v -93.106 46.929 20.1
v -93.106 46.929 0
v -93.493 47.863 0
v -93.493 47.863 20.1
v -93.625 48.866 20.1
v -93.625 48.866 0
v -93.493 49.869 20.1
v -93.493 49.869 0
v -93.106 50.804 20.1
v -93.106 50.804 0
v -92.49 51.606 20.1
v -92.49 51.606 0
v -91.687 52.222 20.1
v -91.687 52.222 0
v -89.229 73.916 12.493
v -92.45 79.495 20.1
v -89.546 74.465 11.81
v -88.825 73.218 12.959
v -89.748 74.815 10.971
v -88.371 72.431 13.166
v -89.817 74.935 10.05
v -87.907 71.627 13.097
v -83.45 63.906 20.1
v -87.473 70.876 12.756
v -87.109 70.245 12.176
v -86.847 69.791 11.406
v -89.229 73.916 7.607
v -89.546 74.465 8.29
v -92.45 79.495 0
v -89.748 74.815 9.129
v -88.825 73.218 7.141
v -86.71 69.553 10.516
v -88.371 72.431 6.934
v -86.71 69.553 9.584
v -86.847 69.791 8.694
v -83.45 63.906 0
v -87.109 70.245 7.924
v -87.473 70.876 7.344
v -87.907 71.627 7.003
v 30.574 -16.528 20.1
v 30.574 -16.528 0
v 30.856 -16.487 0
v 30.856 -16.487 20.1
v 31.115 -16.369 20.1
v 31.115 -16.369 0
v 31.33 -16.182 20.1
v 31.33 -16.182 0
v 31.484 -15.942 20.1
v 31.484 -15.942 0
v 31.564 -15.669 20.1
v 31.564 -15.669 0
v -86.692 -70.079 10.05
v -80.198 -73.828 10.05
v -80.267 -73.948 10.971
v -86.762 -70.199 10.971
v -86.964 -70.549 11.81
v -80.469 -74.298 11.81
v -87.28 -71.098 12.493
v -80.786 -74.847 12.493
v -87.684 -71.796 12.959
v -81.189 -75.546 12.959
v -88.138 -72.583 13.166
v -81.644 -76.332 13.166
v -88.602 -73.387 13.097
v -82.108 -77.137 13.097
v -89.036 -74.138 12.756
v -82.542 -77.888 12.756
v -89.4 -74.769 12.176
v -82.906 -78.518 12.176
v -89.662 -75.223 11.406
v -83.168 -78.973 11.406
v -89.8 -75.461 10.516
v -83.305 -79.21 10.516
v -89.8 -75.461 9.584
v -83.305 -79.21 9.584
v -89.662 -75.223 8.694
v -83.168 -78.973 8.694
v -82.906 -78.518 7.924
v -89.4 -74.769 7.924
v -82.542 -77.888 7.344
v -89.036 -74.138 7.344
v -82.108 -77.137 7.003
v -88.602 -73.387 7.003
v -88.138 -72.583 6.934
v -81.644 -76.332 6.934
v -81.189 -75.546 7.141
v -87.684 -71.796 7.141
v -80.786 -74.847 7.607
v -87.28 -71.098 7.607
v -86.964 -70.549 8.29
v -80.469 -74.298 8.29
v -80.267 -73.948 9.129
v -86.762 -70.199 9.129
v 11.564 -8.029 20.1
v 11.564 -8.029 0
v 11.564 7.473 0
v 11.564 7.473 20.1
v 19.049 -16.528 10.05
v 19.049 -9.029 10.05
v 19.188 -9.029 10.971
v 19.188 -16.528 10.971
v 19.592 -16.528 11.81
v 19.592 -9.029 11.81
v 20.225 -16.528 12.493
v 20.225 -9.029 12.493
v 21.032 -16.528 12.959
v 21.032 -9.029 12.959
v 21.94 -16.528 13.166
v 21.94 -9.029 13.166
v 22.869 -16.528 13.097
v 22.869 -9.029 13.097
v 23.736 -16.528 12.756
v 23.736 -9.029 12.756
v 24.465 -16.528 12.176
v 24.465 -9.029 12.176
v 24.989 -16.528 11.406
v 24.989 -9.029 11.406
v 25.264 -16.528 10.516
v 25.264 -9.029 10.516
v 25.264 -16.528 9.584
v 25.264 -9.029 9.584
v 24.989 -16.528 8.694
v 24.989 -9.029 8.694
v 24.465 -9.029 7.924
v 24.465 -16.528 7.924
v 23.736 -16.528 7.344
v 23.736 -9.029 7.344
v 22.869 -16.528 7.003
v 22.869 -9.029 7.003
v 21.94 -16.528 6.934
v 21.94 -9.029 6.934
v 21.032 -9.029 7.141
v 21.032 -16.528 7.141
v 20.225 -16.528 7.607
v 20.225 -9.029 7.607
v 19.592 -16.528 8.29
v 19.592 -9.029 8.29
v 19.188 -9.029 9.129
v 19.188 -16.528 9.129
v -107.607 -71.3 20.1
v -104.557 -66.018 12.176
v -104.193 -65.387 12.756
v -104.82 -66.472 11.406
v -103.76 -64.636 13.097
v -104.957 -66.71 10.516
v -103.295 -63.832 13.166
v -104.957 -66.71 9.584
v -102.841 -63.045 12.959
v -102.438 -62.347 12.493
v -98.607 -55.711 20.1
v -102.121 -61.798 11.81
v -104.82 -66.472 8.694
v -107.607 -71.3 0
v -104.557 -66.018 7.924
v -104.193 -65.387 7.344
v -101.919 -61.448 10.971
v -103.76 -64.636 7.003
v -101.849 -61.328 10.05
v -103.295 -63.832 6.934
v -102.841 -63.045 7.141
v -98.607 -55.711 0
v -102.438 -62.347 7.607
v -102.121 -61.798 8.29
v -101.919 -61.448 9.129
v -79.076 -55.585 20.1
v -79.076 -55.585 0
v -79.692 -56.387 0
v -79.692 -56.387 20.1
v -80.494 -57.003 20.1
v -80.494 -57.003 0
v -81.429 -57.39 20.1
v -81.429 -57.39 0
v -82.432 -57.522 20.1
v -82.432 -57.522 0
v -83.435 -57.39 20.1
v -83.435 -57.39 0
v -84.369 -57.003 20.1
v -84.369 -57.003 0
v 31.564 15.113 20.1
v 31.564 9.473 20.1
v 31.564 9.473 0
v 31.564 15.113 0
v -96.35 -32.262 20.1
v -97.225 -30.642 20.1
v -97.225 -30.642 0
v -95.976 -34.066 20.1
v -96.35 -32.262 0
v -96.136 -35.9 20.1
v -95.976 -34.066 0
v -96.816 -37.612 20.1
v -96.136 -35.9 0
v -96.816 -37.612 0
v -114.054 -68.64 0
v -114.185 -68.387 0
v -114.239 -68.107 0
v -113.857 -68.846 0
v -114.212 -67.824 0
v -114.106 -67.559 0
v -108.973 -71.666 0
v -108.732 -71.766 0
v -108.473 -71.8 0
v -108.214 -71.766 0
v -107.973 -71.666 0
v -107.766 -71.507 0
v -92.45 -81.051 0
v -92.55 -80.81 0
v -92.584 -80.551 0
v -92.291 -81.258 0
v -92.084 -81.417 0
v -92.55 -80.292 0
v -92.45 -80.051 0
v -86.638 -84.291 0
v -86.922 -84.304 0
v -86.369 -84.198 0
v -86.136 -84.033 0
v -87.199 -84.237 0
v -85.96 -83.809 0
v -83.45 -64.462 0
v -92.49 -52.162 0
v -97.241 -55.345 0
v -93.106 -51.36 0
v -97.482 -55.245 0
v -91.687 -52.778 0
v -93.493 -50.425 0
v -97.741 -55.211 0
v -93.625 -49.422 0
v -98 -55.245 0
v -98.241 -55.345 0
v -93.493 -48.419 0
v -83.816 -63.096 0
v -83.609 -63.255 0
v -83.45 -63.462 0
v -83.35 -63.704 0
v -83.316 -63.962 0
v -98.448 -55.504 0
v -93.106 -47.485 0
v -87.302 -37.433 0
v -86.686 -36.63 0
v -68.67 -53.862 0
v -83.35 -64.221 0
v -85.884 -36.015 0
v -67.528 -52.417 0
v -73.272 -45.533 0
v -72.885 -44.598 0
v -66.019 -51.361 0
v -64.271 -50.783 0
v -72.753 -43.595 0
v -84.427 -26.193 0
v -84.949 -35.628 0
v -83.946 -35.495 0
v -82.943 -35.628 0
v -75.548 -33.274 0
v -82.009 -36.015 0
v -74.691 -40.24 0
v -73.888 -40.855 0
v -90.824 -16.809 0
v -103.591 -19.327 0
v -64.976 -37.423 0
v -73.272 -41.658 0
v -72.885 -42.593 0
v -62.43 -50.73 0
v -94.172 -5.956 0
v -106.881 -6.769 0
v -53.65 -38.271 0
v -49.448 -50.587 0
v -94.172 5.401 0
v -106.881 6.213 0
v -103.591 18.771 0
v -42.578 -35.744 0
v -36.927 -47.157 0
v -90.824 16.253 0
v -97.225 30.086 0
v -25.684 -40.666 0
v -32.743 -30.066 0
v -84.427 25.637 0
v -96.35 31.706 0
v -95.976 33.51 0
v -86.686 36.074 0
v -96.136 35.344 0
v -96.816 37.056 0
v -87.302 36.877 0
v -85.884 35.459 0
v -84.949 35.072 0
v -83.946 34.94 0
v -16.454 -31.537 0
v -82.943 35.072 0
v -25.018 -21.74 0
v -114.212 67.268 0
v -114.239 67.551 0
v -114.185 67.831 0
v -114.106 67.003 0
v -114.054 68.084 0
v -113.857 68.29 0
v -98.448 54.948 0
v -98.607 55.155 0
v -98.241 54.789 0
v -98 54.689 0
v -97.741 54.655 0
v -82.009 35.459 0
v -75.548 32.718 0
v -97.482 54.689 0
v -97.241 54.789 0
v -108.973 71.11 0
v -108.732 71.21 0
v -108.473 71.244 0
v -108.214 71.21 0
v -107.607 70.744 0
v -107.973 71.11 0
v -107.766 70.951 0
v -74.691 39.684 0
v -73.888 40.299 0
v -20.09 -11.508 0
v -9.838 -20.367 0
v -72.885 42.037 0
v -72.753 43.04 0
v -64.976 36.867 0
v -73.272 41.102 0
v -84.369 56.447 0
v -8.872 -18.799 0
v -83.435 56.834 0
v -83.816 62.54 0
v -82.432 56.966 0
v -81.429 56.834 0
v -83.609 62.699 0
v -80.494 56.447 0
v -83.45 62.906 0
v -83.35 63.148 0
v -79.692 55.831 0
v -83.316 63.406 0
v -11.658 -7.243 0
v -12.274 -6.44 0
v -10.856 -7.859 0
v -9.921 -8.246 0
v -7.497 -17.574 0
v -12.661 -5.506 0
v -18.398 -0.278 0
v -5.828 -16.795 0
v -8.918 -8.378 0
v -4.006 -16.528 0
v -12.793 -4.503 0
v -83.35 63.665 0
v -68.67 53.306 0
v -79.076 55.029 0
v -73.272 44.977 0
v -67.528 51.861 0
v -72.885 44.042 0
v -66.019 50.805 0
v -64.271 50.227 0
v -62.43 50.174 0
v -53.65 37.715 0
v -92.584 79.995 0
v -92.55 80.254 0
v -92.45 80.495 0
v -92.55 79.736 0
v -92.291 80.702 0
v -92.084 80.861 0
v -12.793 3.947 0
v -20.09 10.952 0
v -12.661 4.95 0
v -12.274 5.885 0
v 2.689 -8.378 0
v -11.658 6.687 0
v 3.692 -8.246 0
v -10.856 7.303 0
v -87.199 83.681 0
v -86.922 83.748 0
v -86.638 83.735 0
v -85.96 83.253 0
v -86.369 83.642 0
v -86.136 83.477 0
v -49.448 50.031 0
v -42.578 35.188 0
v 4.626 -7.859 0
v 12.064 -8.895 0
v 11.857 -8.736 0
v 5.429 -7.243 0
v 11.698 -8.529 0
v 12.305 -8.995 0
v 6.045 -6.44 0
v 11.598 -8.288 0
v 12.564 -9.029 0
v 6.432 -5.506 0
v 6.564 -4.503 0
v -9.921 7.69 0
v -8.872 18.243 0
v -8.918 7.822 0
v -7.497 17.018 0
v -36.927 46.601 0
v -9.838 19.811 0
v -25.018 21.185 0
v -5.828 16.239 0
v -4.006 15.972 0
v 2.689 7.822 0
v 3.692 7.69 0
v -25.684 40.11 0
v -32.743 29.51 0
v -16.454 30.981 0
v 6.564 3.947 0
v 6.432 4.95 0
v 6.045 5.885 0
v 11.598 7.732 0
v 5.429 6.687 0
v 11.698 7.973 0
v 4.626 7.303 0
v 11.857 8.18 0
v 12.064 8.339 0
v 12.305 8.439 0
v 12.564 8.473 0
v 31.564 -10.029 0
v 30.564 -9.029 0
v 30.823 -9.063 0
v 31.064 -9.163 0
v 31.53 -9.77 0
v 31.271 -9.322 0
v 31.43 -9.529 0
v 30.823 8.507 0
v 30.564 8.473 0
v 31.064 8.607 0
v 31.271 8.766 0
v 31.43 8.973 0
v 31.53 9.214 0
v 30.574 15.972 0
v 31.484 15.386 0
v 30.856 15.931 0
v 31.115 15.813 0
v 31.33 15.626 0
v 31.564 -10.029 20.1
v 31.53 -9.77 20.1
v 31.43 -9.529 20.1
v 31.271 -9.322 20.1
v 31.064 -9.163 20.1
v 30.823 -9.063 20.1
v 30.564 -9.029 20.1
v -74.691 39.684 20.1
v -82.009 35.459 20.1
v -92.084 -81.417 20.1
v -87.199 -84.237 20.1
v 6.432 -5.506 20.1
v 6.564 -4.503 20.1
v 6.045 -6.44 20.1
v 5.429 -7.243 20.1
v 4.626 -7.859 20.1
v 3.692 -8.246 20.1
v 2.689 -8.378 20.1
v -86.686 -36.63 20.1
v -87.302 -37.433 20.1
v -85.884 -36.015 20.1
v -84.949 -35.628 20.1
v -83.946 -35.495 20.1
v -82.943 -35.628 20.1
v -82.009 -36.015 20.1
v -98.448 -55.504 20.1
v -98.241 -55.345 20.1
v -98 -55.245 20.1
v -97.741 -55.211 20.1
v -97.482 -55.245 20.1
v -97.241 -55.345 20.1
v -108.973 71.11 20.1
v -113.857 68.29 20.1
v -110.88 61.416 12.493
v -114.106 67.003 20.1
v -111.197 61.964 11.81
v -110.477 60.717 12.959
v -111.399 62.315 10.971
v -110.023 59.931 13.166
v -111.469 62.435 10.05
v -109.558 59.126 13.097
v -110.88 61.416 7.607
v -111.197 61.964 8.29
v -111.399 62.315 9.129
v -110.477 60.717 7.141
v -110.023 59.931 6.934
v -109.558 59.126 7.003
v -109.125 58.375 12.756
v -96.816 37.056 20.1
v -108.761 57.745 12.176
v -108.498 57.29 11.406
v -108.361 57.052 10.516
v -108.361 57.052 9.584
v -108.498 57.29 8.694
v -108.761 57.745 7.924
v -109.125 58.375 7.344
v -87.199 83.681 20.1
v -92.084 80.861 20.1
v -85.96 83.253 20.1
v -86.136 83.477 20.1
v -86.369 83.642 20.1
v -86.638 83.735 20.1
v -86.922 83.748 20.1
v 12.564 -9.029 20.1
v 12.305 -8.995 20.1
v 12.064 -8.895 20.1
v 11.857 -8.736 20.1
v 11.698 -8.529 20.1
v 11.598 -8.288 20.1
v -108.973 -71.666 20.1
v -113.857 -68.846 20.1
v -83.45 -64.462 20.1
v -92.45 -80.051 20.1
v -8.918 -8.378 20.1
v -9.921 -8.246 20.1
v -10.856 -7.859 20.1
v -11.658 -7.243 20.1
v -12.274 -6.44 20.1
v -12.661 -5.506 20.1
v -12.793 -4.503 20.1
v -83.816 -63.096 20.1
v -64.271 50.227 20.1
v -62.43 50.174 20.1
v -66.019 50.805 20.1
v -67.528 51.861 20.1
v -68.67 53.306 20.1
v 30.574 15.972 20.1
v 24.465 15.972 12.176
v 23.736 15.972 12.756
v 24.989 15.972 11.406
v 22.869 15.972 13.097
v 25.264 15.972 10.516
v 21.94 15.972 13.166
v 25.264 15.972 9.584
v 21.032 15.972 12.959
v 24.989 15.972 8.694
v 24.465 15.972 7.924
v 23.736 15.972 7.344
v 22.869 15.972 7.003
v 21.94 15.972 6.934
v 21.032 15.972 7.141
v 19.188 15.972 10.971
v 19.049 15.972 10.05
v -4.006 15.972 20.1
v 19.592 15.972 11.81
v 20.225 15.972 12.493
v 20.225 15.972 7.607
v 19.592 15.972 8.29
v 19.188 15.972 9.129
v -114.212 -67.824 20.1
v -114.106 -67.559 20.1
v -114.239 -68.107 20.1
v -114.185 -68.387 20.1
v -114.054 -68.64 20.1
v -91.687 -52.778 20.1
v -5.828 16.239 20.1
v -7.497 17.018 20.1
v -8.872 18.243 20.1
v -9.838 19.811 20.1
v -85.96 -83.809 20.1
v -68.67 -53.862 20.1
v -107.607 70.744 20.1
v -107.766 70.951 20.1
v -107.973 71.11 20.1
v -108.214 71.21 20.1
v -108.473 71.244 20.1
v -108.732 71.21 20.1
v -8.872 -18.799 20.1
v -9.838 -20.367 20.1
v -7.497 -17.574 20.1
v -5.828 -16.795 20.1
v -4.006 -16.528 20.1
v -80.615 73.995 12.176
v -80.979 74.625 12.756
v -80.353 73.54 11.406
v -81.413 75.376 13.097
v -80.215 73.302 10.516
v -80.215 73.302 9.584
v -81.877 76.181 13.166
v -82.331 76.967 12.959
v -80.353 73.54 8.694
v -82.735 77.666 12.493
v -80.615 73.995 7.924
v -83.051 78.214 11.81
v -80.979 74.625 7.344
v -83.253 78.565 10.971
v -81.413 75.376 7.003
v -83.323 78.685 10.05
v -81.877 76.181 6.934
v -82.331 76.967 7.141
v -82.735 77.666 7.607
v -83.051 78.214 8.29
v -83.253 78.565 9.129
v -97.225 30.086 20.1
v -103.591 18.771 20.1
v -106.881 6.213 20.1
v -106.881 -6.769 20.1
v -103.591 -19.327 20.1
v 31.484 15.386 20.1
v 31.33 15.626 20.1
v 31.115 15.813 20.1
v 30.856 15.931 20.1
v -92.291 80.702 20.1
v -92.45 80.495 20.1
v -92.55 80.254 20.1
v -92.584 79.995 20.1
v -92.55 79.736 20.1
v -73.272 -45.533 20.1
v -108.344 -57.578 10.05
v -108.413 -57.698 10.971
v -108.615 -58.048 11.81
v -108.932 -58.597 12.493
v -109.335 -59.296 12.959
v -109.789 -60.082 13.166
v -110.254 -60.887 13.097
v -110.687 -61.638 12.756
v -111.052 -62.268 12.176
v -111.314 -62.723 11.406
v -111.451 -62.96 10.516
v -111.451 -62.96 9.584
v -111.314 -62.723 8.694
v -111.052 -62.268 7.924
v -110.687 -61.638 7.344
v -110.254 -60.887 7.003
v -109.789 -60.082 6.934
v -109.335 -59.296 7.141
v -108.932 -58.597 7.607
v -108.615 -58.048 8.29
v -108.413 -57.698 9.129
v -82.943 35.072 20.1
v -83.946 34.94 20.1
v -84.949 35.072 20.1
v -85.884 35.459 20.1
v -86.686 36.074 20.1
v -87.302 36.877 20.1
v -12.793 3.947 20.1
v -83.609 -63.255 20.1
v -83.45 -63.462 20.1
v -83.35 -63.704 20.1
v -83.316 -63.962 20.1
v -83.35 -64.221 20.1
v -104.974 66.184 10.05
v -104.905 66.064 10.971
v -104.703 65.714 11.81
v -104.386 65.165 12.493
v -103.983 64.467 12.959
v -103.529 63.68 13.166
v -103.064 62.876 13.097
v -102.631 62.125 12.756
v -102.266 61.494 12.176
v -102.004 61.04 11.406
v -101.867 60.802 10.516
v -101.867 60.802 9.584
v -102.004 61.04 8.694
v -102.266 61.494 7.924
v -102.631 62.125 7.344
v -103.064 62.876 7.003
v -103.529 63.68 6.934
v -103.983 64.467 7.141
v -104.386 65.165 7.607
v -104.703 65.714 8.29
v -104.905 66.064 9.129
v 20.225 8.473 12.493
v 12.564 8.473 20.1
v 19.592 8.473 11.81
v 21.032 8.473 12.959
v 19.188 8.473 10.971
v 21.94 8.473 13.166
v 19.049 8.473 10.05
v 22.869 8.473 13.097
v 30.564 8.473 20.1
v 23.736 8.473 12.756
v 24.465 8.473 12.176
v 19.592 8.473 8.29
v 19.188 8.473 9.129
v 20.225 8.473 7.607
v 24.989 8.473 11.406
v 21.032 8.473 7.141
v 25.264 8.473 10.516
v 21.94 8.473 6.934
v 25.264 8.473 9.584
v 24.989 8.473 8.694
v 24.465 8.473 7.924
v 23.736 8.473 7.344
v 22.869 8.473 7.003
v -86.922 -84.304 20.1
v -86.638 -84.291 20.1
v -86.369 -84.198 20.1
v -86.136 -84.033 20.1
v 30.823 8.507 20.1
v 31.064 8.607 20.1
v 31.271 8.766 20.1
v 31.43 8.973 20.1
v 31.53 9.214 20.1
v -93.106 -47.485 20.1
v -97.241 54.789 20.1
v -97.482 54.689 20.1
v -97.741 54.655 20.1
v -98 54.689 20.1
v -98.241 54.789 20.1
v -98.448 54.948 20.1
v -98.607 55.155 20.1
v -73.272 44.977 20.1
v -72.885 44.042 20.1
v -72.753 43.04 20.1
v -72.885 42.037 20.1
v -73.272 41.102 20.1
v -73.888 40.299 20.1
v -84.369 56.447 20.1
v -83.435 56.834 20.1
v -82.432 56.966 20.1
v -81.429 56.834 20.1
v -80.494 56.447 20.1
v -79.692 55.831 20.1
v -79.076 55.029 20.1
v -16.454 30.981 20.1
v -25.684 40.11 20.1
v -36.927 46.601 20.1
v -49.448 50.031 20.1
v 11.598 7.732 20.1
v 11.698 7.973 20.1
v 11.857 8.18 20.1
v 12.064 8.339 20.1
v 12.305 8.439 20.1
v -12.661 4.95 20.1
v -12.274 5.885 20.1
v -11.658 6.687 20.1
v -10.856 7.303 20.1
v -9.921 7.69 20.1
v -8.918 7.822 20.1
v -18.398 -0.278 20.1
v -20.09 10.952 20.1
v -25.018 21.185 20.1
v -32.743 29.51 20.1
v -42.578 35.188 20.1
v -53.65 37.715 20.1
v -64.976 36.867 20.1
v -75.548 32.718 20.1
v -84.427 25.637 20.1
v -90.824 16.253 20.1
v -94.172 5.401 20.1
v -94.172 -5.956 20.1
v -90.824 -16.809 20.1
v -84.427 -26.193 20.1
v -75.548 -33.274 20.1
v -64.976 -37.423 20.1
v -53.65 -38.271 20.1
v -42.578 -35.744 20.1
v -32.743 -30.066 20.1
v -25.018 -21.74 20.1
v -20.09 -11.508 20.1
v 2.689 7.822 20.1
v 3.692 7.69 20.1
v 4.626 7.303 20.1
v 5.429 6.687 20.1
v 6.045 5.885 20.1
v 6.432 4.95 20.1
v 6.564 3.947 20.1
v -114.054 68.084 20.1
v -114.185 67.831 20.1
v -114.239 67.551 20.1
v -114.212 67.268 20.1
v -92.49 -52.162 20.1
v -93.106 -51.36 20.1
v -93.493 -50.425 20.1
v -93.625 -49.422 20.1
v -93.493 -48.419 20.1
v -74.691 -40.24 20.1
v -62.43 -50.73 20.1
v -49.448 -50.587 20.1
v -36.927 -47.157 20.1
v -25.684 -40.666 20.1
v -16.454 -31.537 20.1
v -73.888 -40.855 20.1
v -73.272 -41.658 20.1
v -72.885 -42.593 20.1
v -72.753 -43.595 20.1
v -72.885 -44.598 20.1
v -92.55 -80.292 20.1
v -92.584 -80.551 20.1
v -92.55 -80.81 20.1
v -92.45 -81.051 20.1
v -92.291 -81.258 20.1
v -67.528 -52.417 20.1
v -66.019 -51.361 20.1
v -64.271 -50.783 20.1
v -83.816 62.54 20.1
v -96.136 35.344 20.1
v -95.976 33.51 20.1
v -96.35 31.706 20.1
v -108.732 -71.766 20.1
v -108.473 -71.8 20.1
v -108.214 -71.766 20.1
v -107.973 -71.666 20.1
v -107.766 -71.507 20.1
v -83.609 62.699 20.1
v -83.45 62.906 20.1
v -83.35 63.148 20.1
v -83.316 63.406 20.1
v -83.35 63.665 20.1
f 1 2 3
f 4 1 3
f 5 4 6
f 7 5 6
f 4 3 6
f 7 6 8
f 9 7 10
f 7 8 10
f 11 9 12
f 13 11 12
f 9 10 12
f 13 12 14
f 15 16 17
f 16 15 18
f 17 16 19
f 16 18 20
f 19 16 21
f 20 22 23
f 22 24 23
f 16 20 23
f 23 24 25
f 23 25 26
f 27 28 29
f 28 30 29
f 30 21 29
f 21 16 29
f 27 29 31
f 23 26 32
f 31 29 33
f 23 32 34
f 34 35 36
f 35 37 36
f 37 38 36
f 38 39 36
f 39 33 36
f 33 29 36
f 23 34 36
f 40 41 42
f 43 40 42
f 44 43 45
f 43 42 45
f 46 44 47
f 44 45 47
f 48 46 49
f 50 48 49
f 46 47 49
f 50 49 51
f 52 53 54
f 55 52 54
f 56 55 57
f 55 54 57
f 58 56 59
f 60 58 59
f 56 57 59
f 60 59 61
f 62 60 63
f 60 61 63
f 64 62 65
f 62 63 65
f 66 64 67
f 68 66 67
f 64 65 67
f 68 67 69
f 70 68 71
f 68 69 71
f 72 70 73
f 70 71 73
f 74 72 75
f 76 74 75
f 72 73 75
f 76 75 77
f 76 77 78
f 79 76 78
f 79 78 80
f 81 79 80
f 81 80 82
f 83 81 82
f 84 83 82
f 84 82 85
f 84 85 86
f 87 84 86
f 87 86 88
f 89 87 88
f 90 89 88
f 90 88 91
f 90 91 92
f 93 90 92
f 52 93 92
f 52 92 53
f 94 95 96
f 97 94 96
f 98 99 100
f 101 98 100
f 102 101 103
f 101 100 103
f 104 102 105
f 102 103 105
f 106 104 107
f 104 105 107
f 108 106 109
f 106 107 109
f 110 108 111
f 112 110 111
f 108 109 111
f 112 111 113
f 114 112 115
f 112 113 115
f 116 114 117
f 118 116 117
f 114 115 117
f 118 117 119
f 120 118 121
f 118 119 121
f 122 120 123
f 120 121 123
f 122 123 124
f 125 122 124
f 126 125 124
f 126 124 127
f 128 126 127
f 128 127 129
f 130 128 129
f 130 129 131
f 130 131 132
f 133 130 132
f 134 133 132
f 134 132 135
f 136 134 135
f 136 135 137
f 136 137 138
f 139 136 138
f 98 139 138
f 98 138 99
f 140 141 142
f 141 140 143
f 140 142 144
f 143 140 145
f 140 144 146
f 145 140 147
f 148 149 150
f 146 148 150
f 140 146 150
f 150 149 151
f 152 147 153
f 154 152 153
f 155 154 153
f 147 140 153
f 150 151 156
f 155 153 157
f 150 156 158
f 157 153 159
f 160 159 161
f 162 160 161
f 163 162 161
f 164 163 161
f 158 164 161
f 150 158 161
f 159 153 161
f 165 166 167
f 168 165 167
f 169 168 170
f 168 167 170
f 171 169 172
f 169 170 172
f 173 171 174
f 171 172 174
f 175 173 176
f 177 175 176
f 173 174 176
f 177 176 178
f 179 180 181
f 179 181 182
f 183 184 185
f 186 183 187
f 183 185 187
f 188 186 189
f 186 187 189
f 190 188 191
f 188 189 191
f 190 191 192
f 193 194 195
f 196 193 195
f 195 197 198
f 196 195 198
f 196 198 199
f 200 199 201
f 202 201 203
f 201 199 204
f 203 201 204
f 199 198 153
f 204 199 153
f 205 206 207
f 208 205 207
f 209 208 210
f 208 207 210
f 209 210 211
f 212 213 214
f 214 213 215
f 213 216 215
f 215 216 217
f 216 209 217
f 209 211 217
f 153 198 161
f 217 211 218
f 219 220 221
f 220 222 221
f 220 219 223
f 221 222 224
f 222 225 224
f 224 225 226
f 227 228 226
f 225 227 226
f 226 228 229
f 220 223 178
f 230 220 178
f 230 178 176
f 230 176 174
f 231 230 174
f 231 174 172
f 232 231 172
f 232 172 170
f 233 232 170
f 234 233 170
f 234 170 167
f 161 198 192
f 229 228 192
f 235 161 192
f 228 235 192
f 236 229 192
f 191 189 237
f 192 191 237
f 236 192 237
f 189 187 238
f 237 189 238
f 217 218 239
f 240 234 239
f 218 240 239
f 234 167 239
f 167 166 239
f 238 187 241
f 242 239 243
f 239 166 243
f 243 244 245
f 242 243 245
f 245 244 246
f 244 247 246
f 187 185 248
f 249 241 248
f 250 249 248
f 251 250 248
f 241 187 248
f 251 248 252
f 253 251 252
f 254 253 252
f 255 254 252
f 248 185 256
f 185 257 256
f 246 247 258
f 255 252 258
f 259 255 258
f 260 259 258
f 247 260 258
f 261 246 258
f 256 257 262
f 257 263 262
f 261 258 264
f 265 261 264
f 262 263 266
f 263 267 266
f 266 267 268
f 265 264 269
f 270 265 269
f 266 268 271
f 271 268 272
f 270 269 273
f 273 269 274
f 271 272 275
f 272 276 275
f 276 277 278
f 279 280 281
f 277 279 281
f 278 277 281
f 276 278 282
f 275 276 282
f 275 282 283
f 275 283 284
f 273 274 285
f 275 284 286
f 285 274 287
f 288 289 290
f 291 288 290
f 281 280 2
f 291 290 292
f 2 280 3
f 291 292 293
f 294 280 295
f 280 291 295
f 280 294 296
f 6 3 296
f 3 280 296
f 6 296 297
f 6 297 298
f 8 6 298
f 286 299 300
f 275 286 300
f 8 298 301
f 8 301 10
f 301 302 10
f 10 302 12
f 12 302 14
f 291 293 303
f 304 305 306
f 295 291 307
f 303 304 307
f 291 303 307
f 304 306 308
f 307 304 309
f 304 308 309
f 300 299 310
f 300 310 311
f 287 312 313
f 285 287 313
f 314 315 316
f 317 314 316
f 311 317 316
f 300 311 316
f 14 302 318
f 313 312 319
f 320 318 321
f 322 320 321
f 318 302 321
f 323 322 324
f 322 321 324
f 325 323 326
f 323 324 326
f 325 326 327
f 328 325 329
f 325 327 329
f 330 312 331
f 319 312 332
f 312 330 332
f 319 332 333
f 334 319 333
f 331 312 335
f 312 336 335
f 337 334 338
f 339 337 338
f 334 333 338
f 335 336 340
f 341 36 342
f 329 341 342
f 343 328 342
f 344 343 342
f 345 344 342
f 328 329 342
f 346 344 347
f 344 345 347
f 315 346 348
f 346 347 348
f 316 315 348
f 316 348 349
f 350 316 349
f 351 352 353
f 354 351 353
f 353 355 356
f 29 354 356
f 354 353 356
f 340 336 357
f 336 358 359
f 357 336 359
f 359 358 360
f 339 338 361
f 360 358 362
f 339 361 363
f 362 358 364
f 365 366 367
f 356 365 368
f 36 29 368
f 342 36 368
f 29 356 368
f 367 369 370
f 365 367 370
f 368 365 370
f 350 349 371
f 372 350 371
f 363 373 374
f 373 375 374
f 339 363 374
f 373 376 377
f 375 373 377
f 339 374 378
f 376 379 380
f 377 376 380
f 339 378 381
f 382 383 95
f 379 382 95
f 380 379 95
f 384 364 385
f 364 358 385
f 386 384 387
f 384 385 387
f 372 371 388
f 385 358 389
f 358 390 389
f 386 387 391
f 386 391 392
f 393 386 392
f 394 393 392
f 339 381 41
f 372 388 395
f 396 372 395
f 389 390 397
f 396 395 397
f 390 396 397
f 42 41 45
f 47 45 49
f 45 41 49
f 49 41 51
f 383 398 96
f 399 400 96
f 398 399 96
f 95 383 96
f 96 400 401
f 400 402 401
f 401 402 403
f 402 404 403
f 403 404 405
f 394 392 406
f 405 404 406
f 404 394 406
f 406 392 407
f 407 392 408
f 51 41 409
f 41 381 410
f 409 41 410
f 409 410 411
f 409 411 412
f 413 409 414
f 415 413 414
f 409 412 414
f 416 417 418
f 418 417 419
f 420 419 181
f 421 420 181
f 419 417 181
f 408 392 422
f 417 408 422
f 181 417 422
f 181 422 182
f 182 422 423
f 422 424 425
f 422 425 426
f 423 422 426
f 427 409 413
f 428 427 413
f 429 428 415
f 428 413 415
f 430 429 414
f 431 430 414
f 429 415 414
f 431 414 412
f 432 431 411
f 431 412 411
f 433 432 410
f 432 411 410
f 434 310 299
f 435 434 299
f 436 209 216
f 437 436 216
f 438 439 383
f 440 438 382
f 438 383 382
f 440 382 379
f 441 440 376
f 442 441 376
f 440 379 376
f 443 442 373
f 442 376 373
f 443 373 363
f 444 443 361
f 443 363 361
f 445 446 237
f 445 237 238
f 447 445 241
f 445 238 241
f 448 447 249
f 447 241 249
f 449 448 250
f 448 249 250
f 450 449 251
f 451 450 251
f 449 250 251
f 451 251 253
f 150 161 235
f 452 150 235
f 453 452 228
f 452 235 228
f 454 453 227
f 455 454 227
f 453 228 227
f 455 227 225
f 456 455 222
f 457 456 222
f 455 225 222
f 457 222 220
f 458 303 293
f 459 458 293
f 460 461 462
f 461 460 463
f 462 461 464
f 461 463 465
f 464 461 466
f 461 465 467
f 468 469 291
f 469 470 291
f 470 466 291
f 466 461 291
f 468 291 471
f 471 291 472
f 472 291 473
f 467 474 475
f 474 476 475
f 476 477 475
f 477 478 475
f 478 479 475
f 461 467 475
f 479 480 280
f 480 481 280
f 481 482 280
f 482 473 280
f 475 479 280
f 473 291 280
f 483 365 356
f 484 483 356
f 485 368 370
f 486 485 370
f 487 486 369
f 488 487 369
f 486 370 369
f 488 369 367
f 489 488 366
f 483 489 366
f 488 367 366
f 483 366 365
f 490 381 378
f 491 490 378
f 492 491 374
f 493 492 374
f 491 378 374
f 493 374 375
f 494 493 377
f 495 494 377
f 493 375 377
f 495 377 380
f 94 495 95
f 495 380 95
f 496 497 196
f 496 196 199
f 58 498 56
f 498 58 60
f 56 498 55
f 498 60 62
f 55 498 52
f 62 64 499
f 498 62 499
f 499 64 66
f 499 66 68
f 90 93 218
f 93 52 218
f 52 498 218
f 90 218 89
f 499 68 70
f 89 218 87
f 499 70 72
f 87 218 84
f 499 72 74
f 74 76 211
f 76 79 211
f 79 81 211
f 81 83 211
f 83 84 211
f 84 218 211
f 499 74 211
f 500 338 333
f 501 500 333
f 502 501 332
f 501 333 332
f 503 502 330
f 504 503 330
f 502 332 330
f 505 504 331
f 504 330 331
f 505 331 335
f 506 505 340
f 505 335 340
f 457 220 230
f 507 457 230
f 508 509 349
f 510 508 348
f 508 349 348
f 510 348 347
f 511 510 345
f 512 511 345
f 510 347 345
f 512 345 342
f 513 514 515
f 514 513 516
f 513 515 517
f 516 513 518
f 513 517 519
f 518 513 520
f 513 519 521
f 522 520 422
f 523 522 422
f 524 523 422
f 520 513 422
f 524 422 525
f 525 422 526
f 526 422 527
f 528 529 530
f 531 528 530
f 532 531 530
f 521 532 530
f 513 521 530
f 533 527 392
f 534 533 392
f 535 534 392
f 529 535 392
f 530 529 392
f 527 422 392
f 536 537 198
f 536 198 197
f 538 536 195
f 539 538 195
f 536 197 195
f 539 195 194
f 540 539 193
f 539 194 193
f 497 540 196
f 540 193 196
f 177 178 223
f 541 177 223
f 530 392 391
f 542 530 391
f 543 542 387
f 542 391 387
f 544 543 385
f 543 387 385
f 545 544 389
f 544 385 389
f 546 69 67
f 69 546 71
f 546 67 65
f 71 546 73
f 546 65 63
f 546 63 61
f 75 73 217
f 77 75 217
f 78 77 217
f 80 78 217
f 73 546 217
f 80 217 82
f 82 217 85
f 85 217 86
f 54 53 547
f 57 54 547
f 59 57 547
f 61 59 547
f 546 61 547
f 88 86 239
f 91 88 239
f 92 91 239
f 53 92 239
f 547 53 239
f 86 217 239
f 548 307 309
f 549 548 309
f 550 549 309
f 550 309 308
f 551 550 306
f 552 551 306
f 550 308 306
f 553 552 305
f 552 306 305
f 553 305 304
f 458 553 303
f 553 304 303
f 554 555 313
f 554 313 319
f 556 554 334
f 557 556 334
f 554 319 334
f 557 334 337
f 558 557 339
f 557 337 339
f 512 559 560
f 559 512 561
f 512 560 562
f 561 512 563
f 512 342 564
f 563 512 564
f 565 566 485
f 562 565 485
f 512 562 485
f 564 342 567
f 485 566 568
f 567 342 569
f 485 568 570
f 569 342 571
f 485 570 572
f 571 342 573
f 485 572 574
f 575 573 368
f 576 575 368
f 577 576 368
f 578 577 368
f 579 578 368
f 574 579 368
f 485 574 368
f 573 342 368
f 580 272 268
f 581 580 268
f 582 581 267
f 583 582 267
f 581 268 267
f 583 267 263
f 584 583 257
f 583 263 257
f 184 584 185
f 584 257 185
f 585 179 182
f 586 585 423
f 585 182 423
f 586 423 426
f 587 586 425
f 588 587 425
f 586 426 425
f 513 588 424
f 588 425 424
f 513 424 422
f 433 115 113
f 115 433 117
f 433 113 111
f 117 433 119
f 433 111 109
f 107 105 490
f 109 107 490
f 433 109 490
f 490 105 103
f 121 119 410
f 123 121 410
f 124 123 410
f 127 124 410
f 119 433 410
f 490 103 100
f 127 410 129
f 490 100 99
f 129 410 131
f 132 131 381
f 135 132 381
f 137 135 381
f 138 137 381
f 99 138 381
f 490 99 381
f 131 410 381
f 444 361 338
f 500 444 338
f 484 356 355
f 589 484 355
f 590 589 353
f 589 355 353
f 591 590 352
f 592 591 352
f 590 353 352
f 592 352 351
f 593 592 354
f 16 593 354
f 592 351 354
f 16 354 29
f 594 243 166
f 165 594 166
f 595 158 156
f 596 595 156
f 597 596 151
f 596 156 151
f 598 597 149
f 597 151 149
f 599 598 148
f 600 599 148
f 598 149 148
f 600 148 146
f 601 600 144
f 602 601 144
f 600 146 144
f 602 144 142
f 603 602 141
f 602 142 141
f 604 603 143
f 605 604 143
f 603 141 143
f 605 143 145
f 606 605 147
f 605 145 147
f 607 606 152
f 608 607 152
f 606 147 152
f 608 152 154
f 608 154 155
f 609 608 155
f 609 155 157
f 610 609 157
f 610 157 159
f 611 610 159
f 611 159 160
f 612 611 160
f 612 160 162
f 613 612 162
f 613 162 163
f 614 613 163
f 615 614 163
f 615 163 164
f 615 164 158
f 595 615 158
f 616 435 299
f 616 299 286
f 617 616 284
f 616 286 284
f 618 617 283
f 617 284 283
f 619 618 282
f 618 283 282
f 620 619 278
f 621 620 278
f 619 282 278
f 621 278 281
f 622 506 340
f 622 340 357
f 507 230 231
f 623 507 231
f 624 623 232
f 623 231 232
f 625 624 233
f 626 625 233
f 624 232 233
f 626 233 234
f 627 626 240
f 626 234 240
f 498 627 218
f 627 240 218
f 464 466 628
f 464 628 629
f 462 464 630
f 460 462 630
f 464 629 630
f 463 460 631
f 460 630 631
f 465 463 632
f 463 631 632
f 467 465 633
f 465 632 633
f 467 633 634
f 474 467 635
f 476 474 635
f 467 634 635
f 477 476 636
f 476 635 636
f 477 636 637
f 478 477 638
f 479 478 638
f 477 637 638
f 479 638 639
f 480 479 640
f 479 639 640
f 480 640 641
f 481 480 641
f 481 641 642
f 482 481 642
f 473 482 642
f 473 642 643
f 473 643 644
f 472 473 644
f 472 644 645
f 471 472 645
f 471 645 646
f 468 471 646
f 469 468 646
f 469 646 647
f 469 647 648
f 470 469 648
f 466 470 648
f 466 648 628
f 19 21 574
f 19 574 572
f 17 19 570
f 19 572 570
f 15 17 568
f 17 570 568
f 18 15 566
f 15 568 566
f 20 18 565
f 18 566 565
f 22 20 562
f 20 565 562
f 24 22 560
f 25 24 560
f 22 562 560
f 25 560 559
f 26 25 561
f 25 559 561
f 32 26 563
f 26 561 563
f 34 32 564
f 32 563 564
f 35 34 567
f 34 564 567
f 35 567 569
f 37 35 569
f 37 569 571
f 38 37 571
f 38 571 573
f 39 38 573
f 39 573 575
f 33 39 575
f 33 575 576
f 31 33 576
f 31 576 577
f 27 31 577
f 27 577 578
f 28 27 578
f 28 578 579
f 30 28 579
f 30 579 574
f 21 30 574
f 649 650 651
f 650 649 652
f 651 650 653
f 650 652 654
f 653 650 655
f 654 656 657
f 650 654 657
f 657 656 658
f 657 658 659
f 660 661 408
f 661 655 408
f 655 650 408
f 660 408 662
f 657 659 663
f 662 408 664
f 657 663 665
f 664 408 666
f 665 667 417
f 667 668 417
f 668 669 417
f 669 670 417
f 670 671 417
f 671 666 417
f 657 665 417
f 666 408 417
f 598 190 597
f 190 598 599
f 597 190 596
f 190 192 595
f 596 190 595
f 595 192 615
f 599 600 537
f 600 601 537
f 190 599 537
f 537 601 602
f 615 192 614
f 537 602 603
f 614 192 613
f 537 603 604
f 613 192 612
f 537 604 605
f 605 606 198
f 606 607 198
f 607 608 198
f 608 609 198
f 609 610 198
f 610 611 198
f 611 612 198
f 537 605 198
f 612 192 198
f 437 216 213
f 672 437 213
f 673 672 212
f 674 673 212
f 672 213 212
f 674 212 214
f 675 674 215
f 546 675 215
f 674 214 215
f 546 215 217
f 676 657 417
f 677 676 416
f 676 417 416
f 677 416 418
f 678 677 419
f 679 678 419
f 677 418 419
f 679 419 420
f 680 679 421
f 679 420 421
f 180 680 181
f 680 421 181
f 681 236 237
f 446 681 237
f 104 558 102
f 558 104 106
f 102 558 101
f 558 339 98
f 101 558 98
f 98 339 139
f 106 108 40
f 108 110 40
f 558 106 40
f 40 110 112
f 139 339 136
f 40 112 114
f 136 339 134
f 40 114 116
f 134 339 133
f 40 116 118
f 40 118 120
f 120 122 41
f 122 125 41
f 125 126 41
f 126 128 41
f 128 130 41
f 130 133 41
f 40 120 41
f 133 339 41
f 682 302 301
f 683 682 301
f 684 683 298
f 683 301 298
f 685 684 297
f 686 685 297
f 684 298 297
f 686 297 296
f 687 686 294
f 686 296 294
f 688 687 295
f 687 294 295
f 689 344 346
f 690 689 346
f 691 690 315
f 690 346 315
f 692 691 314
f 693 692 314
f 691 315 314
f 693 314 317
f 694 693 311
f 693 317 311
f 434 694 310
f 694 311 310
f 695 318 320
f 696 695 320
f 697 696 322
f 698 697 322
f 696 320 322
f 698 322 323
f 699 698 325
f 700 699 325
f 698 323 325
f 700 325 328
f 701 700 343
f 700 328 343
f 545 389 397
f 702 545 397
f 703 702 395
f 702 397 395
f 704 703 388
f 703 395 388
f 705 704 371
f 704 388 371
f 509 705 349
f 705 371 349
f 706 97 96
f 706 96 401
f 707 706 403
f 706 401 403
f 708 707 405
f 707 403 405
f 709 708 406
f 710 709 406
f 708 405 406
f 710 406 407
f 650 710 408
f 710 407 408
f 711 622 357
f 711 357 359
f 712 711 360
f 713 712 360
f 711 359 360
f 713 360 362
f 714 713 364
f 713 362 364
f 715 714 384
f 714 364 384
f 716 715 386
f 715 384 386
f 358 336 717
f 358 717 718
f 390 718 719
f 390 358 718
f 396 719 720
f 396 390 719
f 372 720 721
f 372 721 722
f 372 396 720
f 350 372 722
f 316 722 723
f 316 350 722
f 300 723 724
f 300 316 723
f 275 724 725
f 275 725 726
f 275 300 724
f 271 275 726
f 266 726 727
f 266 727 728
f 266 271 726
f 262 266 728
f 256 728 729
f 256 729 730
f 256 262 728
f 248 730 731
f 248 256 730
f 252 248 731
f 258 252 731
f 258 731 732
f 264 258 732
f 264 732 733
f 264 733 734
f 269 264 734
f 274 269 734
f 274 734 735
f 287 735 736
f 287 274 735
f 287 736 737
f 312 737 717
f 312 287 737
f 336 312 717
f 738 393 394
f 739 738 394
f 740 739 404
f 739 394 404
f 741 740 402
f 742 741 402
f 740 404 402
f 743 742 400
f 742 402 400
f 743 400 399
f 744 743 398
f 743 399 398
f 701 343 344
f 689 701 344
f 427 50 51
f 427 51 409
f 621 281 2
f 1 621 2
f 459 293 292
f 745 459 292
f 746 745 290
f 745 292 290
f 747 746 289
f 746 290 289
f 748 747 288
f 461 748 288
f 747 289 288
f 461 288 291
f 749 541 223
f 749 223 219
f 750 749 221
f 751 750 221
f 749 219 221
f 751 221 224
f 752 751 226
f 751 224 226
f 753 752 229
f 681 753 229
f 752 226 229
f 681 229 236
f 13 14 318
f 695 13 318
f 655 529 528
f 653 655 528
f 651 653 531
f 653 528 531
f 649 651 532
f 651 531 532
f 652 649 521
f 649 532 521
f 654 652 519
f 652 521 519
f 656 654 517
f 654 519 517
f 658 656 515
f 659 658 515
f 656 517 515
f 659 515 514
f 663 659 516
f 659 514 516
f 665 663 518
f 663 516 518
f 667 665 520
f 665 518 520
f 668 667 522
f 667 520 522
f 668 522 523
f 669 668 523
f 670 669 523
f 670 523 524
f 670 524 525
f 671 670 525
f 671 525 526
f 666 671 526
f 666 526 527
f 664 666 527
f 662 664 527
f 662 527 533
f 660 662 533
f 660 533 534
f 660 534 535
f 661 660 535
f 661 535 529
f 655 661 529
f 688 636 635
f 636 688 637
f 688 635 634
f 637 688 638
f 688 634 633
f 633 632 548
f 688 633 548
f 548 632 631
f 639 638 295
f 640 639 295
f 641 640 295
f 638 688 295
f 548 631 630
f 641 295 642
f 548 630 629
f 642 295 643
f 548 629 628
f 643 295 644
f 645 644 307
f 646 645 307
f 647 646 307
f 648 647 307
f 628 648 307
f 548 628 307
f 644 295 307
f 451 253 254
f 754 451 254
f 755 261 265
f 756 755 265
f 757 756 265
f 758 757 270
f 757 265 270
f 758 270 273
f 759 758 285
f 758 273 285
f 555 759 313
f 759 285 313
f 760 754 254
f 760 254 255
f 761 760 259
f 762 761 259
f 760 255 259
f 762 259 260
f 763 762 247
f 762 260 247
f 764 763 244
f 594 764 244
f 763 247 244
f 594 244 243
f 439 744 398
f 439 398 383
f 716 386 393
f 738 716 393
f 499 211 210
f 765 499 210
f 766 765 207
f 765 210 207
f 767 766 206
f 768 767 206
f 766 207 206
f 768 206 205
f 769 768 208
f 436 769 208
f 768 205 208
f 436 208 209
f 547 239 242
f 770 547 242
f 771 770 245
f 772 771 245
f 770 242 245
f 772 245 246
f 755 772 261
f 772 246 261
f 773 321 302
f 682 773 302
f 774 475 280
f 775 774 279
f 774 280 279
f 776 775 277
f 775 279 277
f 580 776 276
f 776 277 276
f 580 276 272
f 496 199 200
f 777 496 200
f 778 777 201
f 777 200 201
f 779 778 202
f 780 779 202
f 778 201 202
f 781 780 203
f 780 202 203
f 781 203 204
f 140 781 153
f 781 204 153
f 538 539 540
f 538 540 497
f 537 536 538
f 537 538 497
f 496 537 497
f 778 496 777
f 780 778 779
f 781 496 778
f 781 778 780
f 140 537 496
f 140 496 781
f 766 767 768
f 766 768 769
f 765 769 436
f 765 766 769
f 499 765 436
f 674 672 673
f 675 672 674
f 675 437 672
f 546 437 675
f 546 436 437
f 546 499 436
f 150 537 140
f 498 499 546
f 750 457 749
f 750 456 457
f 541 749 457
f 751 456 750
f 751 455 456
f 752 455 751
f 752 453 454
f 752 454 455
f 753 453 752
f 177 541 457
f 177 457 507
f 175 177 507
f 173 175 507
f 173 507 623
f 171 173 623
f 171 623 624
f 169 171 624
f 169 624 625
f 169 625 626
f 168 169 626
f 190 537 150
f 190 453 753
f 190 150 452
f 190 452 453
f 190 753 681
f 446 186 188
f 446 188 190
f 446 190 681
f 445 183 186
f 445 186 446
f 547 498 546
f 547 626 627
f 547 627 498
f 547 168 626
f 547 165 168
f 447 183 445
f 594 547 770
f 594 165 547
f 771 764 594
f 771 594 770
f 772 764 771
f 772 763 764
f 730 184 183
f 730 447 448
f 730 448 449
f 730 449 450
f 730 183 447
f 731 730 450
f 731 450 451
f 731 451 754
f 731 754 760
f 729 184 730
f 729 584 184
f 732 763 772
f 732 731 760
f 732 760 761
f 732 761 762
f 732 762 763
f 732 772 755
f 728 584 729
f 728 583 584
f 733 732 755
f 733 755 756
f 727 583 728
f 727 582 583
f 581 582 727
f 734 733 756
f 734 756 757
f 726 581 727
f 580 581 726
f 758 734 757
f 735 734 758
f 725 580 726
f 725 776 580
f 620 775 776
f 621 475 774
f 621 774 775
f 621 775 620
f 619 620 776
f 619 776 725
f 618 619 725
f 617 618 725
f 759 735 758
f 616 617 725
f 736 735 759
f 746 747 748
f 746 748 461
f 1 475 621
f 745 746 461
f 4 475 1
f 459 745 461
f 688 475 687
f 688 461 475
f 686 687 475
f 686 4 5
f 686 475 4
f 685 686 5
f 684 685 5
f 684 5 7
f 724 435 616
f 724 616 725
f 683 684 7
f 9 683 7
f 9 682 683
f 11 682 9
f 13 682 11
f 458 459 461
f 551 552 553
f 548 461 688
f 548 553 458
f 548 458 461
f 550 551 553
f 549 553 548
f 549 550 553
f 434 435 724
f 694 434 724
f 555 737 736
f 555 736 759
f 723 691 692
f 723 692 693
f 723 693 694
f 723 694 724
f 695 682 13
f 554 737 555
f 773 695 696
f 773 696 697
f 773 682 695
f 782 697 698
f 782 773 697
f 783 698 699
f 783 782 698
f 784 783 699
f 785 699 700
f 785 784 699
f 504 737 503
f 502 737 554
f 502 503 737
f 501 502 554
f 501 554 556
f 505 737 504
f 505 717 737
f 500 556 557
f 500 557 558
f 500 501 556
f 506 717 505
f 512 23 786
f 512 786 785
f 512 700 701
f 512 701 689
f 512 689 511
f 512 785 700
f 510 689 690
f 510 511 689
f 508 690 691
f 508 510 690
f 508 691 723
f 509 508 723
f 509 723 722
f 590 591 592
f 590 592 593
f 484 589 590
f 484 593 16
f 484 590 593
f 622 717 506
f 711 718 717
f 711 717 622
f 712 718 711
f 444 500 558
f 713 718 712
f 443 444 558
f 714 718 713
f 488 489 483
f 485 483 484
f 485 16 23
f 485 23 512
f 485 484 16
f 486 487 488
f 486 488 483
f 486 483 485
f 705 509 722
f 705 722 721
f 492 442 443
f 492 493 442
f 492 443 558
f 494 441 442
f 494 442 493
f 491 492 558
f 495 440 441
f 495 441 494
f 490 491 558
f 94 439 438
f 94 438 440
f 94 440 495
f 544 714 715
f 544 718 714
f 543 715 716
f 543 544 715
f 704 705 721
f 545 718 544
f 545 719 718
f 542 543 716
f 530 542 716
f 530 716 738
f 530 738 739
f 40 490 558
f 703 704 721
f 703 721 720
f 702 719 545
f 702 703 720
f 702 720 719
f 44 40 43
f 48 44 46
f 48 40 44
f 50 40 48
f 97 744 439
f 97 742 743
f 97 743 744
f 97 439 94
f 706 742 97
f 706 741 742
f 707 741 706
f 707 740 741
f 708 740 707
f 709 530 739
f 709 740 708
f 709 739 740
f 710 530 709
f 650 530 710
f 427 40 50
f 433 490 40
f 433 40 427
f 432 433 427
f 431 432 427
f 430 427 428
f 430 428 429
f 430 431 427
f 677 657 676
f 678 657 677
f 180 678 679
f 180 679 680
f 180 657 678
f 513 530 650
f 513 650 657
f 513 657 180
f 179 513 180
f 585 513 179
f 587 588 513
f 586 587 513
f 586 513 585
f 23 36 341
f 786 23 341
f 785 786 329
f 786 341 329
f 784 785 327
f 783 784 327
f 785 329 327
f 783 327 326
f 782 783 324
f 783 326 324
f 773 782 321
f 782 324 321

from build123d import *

# Parameters (mm, degrees)
SKETCH1_R           = 38.1
BOSS_EXTRUDE1_DEPTH = 20.1
SKETCH4_R           = 3.125
CUT_EXTRUDE3_DEPTH  = 134.421728778
SKETCH6_R           = 3.125
CUT_EXTRUDE4_DEPTH  = 134.889662183
SKETCH7_R           = 3.125
CUT_EXTRUDE5_DEPTH  = 154.333276804


with BuildPart() as part:
    # Sketch1 → Boss-Extrude1 (new body)
    with BuildSketch(Plane.XY):
        with BuildLine():
            Line((-87.199197341, 83.680917653), (-92.083580619, 80.860917653))
            ThreePointArc((-92.083580619, 80.860917653), (-92.549506445, 80.253711294), (-92.449606022, 79.494892249))
            Line((-92.449606022, 79.494892249), (-83.449606022, 63.906434981))
            ThreePointArc((-83.449606022, 63.906434981), (-83.3497056, 63.147615936), (-83.815631426, 62.540409577))
            Line((-83.815631426, 62.540409577), (-97.240798671, 54.789385655))
            ThreePointArc((-97.240798671, 54.789385655), (-97.999617716, 54.689485232), (-98.606824075, 55.155411058))
            Line((-98.606824075, 55.155411058), (-107.606824075, 70.743868326))
            ThreePointArc((-107.606824075, 70.743868326), (-108.214030434, 71.209794153), (-108.972849479, 71.10989373))
            Line((-108.972849479, 71.10989373), (-113.857232756, 68.28989373))
            ThreePointArc((-113.857232756, 68.28989373), (-114.221904453, 67.692926638), (-114.106124766, 67.003035183))
            Line((-114.106124766, 67.003035183), (-96.816210848, 37.056025818))
            ThreePointArc((-96.816210848, 37.056025818), (-95.976342212, 33.509634544), (-97.224589096, 30.085579914))
            ThreePointArc((-97.224589096, 30.085579914), (-107.297524567, -0.277987315), (-97.224589096, -30.641554544))
            ThreePointArc((-97.224589096, -30.641554544), (-95.976342212, -34.065609174), (-96.816210848, -37.612000448))
            Line((-96.816210848, -37.612000448), (-114.106124766, -67.559009813))
            ThreePointArc((-114.106124766, -67.559009813), (-114.221904453, -68.248901268), (-113.857232756, -68.84586836))
            Line((-113.857232756, -68.84586836), (-108.972849479, -71.66586836))
            ThreePointArc((-108.972849479, -71.66586836), (-108.214030434, -71.765768783), (-107.606824075, -71.299842956))
            Line((-107.606824075, -71.299842956), (-98.606824075, -55.711385688))
            ThreePointArc((-98.606824075, -55.711385688), (-97.999617716, -55.245459862), (-97.240798671, -55.345360285))
            Line((-97.240798671, -55.345360285), (-83.815631426, -63.096384207))
            ThreePointArc((-83.815631426, -63.096384207), (-83.3497056, -63.703590566), (-83.449606022, -64.462409611))
            Line((-83.449606022, -64.462409611), (-92.449606022, -80.050866879))
            ThreePointArc((-92.449606022, -80.050866879), (-92.549506445, -80.809685924), (-92.083580619, -81.416892283))
            Line((-92.083580619, -81.416892283), (-87.199197341, -84.236892283))
            ThreePointArc((-87.199197341, -84.236892283), (-86.499872826, -84.25422369), (-85.960299143, -83.809009813))
            Line((-85.960299143, -83.809009813), (-68.670385225, -53.862000448))
            ThreePointArc((-68.670385225, -53.862000448), (-66.019054608, -51.361457236), (-62.429612873, -50.730443433))
            ThreePointArc((-62.429612873, -50.730443433), (-31.097524567, -44.272077827), (-9.838371733, -20.366876204))
            ThreePointArc((-9.838371733, -20.366876204), (-7.497176881, -17.573835377), (-4.005977629, -16.527987315))
            Line((-4.005977629, -16.527987315), (30.573850208, -16.527987315))
            ThreePointArc((30.573850208, -16.527987315), (31.229203577, -16.283309737), (31.563856396, -15.669011238))
            Line((31.563856396, -15.669011238), (31.563856396, -10.029011238))
            ThreePointArc((31.563856396, -10.029011238), (31.270963178, -9.321904457), (30.563856396, -9.029011238))
            Line((30.563856396, -9.029011238), (12.563856396, -9.029011238))
            ThreePointArc((12.563856396, -9.029011238), (11.856749615, -8.736118019), (11.563856396, -8.029011238))
            Line((11.563856396, -8.029011238), (11.563856396, 7.473036608))
            ThreePointArc((11.563856396, 7.473036608), (11.856749615, 8.180143389), (12.563856396, 8.473036608))
            Line((12.563856396, 8.473036608), (30.563856396, 8.473036608))
            ThreePointArc((30.563856396, 8.473036608), (31.270963178, 8.765929827), (31.563856396, 9.473036608))
            Line((31.563856396, 9.473036608), (31.563856396, 15.113036608))
            ThreePointArc((31.563856396, 15.113036608), (31.229203577, 15.727335107), (30.573850208, 15.972012685))
            Line((30.573850208, 15.972012685), (-4.005977629, 15.972012685))
            ThreePointArc((-4.005977629, 15.972012685), (-7.497176881, 17.017860747), (-9.838371733, 19.810901574))
            ThreePointArc((-9.838371733, 19.810901574), (-31.097524567, 43.716103197), (-62.429612873, 50.174468803))
            ThreePointArc((-62.429612873, 50.174468803), (-66.019054608, 50.805482606), (-68.670385225, 53.306025818))
            Line((-68.670385225, 53.306025818), (-85.960299143, 83.253035183))
            ThreePointArc((-85.960299143, 83.253035183), (-86.499872826, 83.69824906), (-87.199197341, 83.680917653))
        make_face()
        with BuildLine():
            ThreePointArc((-91.68717238, -52.778245227), (-93.492634957, -50.425320587), (-93.105520819, -47.484896787))
            Line((-93.105520819, -47.484896787), (-87.30204773, -37.432986536))
            ThreePointArc((-87.30204773, -37.432986536), (-84.94912309, -35.627523959), (-82.00869929, -36.014638096))
            Line((-82.00869929, -36.014638096), (-74.690784628, -40.239638096))
            ThreePointArc((-74.690784628, -40.239638096), (-72.885322051, -42.592562736), (-73.272436189, -45.532986536))
            Line((-73.272436189, -45.532986536), (-79.075909278, -55.584896787))
            ThreePointArc((-79.075909278, -55.584896787), (-81.428833918, -57.390359364), (-84.369257718, -57.003245227))
            Line((-84.369257718, -57.003245227), (-91.68717238, -52.778245227))
        make_face(mode=Mode.SUBTRACT)
        with Locations((-56.497524567, -0.277987315)):
            Circle(SKETCH1_R, mode=Mode.SUBTRACT)
        with BuildLine():
            Line((-74.690784628, 39.683663466), (-82.00869929, 35.458663466))
            ThreePointArc((-82.00869929, 35.458663466), (-84.94912309, 35.071549329), (-87.30204773, 36.877011906))
            Line((-87.30204773, 36.877011906), (-93.105520819, 46.928922157))
            ThreePointArc((-93.105520819, 46.928922157), (-93.492634957, 49.869345957), (-91.68717238, 52.222270597))
            Line((-91.68717238, 52.222270597), (-84.369257718, 56.447270597))
            ThreePointArc((-84.369257718, 56.447270597), (-81.428833918, 56.834384734), (-79.075909278, 55.028922157))
            Line((-79.075909278, 55.028922157), (-73.272436189, 44.977011906))
            ThreePointArc((-73.272436189, 44.977011906), (-72.885322051, 42.036588106), (-74.690784628, 39.683663466))
        make_face(mode=Mode.SUBTRACT)
        with BuildLine():
            ThreePointArc((6.563856396, -4.502987315), (5.428895173, -7.243026092), (2.688856396, -8.377987315))
            Line((2.688856396, -8.377987315), (-8.918089783, -8.377987315))
            ThreePointArc((-8.918089783, -8.377987315), (-11.65812856, -7.243026092), (-12.793089783, -4.502987315))
            Line((-12.793089783, -4.502987315), (-12.793089783, 3.947012685))
            ThreePointArc((-12.793089783, 3.947012685), (-11.65812856, 6.687051462), (-8.918089783, 7.822012685))
            Line((-8.918089783, 7.822012685), (2.688856396, 7.822012685))
            ThreePointArc((2.688856396, 7.822012685), (5.428895173, 6.687051462), (6.563856396, 3.947012685))
            Line((6.563856396, 3.947012685), (6.563856396, -4.502987315))
        make_face(mode=Mode.SUBTRACT)
    extrude(amount=BOSS_EXTRUDE1_DEPTH)

    # Sketch4 → Cut-Extrude3 (cut, through all)
    with BuildSketch(Plane(origin=(-28.420602652, -16.408642592, 0), x_dir=(0, 0, -1), z_dir=(0.8660254037844387, 0.49999999999999983, 0))):
        with Locations(Location((-10.05, 106.679392982, 0), (0, 0, 90))):
            Circle(SKETCH4_R)
    extrude(amount=-CUT_EXTRUDE3_DEPTH, mode=Mode.SUBTRACT)

    # Sketch6 → Cut-Extrude4 (cut, through all)
    with BuildSketch(Plane(origin=(-28.179858575, 16.269648934, 0), x_dir=(0, 0, -1), z_dir=(0.8660254037844342, -0.5000000000000079, 0))):
        with Locations(Location((-10.05, -107.160881135, 0), (0, 0, 90))):
            Circle(SKETCH6_R)
    extrude(amount=-CUT_EXTRUDE4_DEPTH, mode=Mode.SUBTRACT)

    # Sketch7 → Cut-Extrude5 (cut, through all)
    with BuildSketch(Plane(origin=(0, 15.972012685, 0), x_dir=(1, 0, 0), z_dir=(0, 1, 0))):
        with Locations(Location((22.173850208, -10.05, 0), (0, 0, 180))):
            Circle(SKETCH7_R)
    extrude(amount=-CUT_EXTRUDE5_DEPTH, mode=Mode.SUBTRACT)


solid = part.part
